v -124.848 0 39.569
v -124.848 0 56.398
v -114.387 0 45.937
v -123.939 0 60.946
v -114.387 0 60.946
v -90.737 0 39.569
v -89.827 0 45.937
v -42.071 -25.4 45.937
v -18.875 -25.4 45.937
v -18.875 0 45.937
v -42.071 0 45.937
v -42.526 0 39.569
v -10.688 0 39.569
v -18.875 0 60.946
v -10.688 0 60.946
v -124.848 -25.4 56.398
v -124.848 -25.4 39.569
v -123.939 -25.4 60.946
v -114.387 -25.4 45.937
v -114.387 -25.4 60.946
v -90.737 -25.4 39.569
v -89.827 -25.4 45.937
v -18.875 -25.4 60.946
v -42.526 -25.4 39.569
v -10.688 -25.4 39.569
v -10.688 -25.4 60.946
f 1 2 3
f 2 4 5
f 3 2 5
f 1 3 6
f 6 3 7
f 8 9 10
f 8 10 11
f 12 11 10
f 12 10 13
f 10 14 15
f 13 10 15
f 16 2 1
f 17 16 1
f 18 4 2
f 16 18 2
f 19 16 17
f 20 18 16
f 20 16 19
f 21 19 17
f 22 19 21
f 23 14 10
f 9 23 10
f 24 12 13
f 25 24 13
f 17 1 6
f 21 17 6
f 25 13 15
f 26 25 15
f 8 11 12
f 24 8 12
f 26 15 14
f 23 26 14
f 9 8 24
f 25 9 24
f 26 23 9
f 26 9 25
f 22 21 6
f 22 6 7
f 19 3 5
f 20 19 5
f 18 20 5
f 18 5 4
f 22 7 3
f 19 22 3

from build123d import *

# Parameters (mm, degrees)
F1_DEPTH = 25.4


with BuildPart() as f1:
    # F0 (on Front) → F1 (new body)
    with BuildSketch(Plane.XZ):
        Polygon((-123.938531, 60.945924), (-124.848172, 56.397721), (-124.848172, 39.569367), (-90.73665, 39.569367), (-89.827009, 45.936856), (-114.387304, 45.936856), (-114.387304, 60.945924), align=None)
        Polygon((-42.070869, 45.936856), (-42.52569, 39.569367), (-10.688271, 39.569367), (-10.688271, 60.945924), (-18.875035, 60.945924), (-18.875035, 45.936856), align=None)
    extrude(amount=F1_DEPTH)


solid = f1.part
